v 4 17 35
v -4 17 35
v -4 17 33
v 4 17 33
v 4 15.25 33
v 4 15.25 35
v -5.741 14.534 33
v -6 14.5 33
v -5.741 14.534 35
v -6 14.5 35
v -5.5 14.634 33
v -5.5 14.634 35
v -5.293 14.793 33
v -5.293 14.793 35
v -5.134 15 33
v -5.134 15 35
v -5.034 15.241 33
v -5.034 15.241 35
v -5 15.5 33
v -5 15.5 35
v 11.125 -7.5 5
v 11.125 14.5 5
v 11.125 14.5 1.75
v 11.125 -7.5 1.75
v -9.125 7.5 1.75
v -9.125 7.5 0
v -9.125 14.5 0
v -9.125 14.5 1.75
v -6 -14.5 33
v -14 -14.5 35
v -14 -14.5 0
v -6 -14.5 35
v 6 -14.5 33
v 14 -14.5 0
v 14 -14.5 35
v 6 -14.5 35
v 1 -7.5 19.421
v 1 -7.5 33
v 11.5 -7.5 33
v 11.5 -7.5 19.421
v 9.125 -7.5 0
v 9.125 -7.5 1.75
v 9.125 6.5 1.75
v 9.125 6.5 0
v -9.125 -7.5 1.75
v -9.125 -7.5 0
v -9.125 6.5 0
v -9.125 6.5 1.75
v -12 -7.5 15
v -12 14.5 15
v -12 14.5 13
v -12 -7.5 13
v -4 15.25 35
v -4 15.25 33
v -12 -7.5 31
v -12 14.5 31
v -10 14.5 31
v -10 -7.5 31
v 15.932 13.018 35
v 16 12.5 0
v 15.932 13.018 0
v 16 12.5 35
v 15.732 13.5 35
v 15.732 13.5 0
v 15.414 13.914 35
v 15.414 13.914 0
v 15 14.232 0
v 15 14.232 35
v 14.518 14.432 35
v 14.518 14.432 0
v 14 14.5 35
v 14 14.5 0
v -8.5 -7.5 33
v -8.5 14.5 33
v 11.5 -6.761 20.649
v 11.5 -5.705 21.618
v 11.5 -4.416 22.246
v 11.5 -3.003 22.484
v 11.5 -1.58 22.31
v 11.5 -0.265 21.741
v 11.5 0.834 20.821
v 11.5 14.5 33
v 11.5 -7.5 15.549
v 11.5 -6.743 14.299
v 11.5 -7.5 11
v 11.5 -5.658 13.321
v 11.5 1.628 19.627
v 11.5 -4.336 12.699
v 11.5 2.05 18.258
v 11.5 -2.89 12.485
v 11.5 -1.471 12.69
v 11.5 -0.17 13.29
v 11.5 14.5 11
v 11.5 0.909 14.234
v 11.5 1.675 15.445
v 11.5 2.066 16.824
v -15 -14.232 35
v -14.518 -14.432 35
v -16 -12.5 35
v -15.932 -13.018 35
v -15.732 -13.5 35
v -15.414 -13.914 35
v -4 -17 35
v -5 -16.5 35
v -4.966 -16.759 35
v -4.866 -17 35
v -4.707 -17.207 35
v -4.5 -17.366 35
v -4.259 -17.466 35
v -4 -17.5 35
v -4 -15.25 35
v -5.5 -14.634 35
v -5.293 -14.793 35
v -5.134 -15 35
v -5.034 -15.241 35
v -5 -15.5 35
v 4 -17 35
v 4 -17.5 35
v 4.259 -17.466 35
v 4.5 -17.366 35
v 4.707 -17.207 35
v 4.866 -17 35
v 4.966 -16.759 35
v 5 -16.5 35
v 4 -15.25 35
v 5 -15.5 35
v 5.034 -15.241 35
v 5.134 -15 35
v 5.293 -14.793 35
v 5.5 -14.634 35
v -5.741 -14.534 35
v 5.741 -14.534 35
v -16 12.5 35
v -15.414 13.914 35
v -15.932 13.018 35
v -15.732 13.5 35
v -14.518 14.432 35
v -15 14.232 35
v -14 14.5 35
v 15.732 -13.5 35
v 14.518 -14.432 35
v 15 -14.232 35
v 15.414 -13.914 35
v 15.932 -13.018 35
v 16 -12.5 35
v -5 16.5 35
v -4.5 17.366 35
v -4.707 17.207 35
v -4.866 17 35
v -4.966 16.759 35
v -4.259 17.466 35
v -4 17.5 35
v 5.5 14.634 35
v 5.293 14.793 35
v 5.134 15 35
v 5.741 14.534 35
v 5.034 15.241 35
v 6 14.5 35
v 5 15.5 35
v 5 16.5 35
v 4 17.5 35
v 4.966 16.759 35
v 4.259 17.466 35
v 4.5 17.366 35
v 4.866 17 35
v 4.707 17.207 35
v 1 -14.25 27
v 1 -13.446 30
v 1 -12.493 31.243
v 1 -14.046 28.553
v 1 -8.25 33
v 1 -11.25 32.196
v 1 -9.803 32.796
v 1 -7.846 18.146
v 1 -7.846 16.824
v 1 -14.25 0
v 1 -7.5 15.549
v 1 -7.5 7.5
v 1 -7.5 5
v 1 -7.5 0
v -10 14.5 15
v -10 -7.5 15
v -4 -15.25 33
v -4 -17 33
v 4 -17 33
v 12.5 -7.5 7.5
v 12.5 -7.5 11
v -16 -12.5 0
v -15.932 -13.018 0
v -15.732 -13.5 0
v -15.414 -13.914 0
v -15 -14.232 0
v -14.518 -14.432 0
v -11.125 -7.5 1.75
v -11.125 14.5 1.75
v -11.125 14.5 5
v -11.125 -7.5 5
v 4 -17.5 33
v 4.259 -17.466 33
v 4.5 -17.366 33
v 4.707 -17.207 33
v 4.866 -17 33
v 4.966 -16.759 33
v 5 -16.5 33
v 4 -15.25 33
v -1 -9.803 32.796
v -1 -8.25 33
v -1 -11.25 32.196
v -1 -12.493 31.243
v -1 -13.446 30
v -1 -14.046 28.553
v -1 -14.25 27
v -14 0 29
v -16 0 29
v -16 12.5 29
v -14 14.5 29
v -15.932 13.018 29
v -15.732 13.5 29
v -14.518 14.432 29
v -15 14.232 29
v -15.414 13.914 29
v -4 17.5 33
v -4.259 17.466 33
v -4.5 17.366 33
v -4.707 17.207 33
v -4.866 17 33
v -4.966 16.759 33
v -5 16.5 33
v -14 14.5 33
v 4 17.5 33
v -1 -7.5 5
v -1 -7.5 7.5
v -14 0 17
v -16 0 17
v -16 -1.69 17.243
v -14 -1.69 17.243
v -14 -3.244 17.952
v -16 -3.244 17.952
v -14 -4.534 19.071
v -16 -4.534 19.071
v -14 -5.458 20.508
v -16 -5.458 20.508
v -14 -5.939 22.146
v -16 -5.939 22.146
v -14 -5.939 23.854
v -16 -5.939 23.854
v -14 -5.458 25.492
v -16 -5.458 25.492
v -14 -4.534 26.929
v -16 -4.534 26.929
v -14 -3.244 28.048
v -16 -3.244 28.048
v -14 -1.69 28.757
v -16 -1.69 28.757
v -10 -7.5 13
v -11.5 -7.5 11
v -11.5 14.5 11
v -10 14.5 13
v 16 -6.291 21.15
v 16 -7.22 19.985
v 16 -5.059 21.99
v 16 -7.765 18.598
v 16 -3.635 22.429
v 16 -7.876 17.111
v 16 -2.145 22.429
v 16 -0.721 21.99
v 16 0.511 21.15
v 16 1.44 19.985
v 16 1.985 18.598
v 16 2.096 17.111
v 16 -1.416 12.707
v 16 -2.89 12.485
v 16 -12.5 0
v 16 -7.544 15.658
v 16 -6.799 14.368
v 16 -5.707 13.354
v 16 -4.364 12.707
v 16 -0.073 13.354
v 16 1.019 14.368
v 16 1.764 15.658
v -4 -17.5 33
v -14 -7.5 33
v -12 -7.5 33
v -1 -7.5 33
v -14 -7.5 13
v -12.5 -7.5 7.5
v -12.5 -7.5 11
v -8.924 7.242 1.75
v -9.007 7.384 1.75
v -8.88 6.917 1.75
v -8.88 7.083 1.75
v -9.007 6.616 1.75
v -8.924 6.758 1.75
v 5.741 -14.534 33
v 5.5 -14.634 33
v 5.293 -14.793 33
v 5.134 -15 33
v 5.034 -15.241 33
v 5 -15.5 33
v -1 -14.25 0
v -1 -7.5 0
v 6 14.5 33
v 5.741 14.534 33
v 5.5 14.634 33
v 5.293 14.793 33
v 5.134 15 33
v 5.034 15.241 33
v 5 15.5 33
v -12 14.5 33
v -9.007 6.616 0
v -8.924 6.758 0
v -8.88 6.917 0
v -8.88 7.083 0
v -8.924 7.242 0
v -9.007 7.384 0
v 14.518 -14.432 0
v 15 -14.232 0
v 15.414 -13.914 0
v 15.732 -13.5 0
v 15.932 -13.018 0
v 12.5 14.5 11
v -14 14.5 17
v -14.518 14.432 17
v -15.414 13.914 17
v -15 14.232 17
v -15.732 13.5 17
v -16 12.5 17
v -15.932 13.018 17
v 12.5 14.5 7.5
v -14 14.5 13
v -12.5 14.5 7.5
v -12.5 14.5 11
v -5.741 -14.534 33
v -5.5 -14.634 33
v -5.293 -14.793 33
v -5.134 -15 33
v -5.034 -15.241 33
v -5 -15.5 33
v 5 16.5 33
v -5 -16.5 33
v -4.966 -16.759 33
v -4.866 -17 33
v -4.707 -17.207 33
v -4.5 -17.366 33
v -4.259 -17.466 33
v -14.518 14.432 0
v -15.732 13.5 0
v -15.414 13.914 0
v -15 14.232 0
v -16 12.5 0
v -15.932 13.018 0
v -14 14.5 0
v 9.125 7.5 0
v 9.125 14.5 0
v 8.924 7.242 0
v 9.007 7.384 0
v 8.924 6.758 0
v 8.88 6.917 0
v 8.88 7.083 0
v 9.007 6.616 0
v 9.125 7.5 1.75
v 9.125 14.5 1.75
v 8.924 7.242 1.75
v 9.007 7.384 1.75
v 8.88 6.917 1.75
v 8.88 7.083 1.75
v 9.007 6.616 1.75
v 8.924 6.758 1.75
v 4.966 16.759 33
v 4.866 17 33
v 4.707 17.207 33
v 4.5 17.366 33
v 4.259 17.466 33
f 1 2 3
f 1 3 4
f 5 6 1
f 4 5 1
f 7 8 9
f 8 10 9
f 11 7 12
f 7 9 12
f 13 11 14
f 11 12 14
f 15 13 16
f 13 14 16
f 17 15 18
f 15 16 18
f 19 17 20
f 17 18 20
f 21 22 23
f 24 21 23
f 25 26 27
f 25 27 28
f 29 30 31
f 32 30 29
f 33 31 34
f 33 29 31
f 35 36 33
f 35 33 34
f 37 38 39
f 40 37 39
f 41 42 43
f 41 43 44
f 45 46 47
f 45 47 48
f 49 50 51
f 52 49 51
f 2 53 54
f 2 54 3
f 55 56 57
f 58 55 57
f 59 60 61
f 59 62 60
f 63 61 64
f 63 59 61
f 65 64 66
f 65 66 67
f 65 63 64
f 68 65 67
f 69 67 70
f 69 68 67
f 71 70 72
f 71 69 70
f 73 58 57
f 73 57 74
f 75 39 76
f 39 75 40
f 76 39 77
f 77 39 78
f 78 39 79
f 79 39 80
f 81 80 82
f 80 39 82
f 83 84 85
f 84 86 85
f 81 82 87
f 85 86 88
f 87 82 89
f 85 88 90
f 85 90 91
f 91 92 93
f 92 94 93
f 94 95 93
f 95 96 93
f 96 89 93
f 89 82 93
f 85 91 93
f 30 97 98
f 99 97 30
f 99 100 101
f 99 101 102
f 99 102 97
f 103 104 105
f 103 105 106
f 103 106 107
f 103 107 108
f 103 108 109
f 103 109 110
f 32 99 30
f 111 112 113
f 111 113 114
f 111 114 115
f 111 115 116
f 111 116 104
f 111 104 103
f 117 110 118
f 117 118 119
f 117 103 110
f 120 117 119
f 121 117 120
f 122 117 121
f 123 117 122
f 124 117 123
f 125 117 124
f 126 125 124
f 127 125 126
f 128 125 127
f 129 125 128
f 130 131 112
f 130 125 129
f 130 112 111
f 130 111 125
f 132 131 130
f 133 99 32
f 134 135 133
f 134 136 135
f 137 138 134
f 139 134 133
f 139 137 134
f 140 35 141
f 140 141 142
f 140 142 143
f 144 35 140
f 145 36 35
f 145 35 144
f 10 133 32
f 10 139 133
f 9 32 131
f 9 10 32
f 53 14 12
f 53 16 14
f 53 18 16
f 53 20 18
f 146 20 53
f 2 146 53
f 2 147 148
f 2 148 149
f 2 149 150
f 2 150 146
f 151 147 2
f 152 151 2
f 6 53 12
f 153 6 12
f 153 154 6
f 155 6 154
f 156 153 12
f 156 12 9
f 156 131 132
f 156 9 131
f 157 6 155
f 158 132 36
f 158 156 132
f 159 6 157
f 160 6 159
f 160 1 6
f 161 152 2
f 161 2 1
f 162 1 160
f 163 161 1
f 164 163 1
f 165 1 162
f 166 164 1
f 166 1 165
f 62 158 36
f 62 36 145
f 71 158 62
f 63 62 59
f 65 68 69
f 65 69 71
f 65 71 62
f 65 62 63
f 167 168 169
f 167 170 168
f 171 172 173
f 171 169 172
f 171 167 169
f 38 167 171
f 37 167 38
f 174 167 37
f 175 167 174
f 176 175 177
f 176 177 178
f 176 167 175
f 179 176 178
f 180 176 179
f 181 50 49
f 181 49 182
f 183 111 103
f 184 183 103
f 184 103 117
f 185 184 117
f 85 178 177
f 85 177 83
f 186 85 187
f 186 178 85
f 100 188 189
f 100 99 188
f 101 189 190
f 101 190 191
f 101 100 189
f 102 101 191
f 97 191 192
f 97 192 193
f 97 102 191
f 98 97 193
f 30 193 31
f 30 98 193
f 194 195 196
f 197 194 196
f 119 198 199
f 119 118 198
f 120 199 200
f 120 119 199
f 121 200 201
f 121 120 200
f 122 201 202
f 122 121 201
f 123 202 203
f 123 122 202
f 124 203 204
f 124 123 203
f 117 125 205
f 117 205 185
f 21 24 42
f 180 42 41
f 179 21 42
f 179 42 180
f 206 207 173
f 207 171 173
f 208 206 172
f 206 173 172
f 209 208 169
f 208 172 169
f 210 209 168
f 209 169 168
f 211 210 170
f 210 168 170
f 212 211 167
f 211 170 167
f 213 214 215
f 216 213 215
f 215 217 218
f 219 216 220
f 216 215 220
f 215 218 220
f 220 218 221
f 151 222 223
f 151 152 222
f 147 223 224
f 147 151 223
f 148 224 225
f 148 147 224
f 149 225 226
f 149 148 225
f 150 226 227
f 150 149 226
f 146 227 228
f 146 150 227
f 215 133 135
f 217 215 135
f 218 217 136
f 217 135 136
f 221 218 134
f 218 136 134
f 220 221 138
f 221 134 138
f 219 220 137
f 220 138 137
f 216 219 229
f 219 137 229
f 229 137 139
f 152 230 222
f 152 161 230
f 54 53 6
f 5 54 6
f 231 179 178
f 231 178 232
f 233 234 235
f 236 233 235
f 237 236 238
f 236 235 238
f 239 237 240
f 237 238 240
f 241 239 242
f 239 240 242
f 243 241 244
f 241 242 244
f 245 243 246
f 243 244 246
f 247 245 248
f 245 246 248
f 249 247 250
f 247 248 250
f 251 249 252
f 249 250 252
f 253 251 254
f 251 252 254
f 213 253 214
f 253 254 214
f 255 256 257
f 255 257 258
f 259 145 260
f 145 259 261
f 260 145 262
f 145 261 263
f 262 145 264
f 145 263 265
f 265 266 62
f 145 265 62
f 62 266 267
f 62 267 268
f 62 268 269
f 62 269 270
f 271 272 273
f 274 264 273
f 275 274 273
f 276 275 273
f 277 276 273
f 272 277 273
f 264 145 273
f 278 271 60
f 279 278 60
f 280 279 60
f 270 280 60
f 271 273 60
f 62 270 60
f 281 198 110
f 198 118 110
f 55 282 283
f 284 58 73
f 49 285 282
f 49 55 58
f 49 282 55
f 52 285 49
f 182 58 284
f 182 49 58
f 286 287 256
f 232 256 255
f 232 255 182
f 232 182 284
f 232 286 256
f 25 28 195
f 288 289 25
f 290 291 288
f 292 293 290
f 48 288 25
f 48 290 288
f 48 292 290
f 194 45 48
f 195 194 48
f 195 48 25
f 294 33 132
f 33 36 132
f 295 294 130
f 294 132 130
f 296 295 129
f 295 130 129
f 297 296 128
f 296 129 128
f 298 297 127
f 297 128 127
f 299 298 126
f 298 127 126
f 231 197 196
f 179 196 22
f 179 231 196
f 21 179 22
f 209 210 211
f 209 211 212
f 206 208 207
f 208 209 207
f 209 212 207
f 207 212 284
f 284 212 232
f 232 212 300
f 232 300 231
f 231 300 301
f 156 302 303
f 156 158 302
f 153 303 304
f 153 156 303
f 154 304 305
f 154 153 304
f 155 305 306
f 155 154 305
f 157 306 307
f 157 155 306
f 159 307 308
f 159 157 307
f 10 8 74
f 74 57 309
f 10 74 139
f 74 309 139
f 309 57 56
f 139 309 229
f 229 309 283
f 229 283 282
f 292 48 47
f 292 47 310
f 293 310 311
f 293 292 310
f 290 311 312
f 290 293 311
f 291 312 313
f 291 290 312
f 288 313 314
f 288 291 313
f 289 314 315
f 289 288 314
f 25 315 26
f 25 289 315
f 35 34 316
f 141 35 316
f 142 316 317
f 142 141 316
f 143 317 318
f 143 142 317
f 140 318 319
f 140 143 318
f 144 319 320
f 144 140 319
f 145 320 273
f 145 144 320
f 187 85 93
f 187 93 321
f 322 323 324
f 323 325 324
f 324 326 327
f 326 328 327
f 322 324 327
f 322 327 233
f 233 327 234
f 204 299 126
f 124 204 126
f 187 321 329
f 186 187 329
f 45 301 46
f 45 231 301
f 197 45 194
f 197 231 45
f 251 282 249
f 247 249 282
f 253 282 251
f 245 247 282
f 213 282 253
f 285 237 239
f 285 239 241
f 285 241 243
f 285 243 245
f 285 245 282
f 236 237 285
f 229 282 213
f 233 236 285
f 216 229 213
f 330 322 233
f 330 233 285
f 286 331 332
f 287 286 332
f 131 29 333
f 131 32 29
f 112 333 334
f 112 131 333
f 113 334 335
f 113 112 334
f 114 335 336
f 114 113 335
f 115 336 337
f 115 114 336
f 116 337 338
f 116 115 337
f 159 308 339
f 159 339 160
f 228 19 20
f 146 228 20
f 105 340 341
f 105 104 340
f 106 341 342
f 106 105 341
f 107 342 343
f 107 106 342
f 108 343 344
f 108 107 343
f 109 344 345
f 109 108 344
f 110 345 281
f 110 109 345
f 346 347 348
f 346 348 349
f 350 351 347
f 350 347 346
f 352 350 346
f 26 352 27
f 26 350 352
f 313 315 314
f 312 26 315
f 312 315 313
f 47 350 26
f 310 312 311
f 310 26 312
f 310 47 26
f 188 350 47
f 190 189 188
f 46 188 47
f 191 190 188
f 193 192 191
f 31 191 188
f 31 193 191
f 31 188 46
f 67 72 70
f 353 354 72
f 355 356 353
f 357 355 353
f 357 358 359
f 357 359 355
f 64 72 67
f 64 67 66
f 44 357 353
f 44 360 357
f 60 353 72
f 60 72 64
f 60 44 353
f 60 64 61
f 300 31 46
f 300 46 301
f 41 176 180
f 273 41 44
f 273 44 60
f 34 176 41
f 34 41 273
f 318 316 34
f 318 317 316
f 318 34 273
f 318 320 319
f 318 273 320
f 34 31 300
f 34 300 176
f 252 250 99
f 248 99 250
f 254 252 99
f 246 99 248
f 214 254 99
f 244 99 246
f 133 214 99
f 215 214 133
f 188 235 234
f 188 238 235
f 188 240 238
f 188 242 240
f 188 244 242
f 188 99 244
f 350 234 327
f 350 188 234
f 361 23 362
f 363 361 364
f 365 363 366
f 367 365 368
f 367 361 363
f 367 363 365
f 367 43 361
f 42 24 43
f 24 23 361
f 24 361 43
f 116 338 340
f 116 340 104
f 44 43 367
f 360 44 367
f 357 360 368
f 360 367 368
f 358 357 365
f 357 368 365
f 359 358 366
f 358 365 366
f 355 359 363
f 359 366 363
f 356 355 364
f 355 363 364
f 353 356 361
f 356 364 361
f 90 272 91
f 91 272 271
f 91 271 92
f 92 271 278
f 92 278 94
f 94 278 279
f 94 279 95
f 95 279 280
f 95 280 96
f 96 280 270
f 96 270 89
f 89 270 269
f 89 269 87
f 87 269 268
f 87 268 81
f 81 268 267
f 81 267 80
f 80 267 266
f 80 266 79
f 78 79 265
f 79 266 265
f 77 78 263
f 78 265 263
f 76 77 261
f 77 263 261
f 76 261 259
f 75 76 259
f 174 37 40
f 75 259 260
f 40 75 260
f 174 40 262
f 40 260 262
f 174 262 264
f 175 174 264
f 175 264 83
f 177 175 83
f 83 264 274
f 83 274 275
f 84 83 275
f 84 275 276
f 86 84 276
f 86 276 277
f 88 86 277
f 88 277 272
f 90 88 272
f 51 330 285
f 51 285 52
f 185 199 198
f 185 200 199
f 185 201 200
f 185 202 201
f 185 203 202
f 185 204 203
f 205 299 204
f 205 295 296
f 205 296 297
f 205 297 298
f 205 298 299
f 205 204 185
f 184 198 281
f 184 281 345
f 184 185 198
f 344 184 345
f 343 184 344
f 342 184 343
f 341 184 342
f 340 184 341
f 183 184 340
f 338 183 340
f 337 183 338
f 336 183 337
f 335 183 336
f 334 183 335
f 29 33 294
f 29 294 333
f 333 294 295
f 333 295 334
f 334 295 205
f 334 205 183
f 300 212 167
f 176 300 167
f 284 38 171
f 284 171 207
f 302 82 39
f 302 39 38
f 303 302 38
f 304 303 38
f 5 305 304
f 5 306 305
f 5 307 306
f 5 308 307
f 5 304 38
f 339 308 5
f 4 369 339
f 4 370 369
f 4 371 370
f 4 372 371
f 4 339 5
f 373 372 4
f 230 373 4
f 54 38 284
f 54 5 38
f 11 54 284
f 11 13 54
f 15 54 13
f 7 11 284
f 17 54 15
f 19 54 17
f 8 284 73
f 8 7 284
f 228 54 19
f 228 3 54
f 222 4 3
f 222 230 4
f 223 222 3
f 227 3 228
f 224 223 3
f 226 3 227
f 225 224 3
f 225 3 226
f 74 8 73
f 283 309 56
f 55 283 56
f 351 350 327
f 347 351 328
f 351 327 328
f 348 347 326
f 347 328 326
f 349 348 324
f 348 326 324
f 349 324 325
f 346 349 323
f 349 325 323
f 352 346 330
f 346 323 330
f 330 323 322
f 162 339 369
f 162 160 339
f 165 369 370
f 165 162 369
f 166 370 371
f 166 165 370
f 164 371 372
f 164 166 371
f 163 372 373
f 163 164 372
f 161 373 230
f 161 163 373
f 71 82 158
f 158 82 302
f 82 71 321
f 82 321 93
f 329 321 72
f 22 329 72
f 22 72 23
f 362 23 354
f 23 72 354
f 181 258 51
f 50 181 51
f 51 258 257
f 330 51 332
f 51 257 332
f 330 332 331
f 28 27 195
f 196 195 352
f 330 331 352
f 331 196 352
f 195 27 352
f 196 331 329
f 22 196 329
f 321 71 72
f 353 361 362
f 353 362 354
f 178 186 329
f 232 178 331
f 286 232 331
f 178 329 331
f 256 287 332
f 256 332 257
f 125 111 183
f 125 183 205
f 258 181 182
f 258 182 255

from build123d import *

# Parameters (mm, degrees)
SKETCH1_W                = 32
SKETCH1_H                = 29
BOSS_EXTRUDE1_DEPTH      = 35
FILLET1_R                = 2
SLOT_FOR_COIL_DEPTH      = 1
SLOT_FOR_COIL_DEPTH_BACK = 30
BOSS_EXTRUDE2_DEPTH      = 7
BOSS_EXTRUDE3_DEPTH      = 1.75
SKETCH5_W                = 2
SKETCH5_H                = 7
CUT_EXTRUDE2_DEPTH       = 33
CUT_EXTRUDE3_DEPTH       = 22
SKETCH7_W                = 2
SKETCH7_H                = 33
BOSS_EXTRUDE4_DEPTH      = 0.25
FILLET2_R                = 6
CUT_EXTRUDE5_DEPTH       = 4.5
SKETCH14_W               = 2.5
SKETCH14_H               = 20
CUT_EXTRUDE6_DEPTH       = 22
SKETCH16_W               = 2
SKETCH16_H               = 2
BOSS_EXTRUDE5_DEPTH      = 22
BOSS_EXTRUDE6_DEPTH      = 22
SKETCH21_W               = 10
SKETCH21_H               = 2
BOSS_EXTRUDE7_DEPTH      = 3
SKETCH23_W               = 8
SKETCH23_H               = 1.75
CUT_EXTRUDE7_DEPTH       = 2
FILLET3_R                = 1
CUT_EXTRUDE8_REACH       = 34
SKETCH26_R               = 5


with BuildPart() as part:
    # Sketch1 → Boss-Extrude1 (new body)
    with BuildSketch(Plane.XY):
        Rectangle(SKETCH1_W, SKETCH1_H)
    extrude(amount=BOSS_EXTRUDE1_DEPTH)

    # Fillet1
    fillet1_edges = [part.edges().sort_by_distance(p)[0] for p in [
        (16, -14.5, 17.5),
        (-16, -14.5, 17.5),
        (-16, 14.5, 17.5),
        (16, 14.5, 17.5),
    ]]
    fillet(fillet1_edges, radius=FILLET1_R)

    # Sketch2 → Slot for Coil (cut, two sides)
    with BuildSketch(Plane.XZ.offset(14.5)) as slot_for_coil_sk:
        Polygon((-9.125, 0), (-9.125, 1.75), (-11.125, 1.75), (-11.125, 5), (11.125, 5), (11.125, 1.75), (9.125, 1.75), (9.125, 0), align=None)
    extrude(amount=SLOT_FOR_COIL_DEPTH, mode=Mode.SUBTRACT)
    extrude(slot_for_coil_sk.sketch, amount=-SLOT_FOR_COIL_DEPTH_BACK, mode=Mode.SUBTRACT)

    # Sketch3 → Boss-Extrude2 (add)
    with BuildSketch(Plane.XZ.offset(14.5)):
        Polygon((-9.125, 0), (-9.125, 1.75), (-11.125, 1.75), (-11.125, 5), (11.125, 5), (11.125, 1.75), (9.125, 1.75), (9.125, 0), align=None)
    extrude(amount=-BOSS_EXTRUDE2_DEPTH)

    # Sketch4 → Boss-Extrude3 (add)
    with BuildSketch(Plane(origin=(0, 0, 1.75), x_dir=(-1, 0, 0), z_dir=(0, 0, -1))):
        with BuildLine():
            Line((-9.125, 7.5), (-9.125, 6.5))
            ThreePointArc((-9.125, 6.5), (-8.875, 7), (-9.125, 7.5))
        make_face()
    boss_extrude3 = extrude(amount=BOSS_EXTRUDE3_DEPTH)

    # Mirror1: Boss-Extrude3 across plane
    add(boss_extrude3.mirror(Plane(origin=(0, 0, 0), x_dir=(0, 0, 1), z_dir=(1, 0, 0))))

    # Sketch5 → Cut-Extrude2 (cut)
    with BuildSketch(Plane(origin=(0, 0, 0), x_dir=(-1, 0, 0), z_dir=(0, 0, -1))):
        with Locations((0, -11)):
            Rectangle(SKETCH5_W, SKETCH5_H)
    extrude(amount=-CUT_EXTRUDE2_DEPTH, mode=Mode.SUBTRACT)

    # Sketch6 → Cut-Extrude3 (cut)
    with BuildSketch(Plane(origin=(0, 14.5, 0), x_dir=(1, 0, 0), z_dir=(0, 1, 0))):
        Polygon((-12.5, -7.5), (-12.5, -11), (-11.5, -11), (-11.5, -33), (11.5, -33), (11.5, -11), (12.5, -11), (12.5, -7.5), align=None)
    extrude(amount=-CUT_EXTRUDE3_DEPTH, mode=Mode.SUBTRACT)

    # Sketch7 → Boss-Extrude4 (add)
    with BuildSketch(Plane.XZ.offset(14.5)):
        with Locations((0, 16.5)):
            Rectangle(SKETCH7_W, SKETCH7_H)
    extrude(amount=-BOSS_EXTRUDE4_DEPTH)

    # Fillet2
    fillet2_edges = [part.edges().sort_by_distance(p)[0] for p in [
        (0, -14.25, 33),
    ]]
    fillet(fillet2_edges, radius=FILLET2_R)

    # Sketch11 → Cut-Extrude5 (cut)
    with BuildSketch(Plane(origin=(-16, 0, 44), x_dir=(0, 0, -1), z_dir=(1, 0, 0))):
        with BuildLine():
            Line((27, 25), (27, 0))
            ThreePointArc((27, 0), (21, -6), (15, 0))
            Line((15, 0), (15, 25))
            ThreePointArc((15, 25), (21, 31), (27, 25))
        make_face()
    extrude(amount=CUT_EXTRUDE5_DEPTH, mode=Mode.SUBTRACT)

    # Sketch14 → Cut-Extrude6 (cut)
    with BuildSketch(Plane(origin=(0, 14.5, 0), x_dir=(1, 0, 0), z_dir=(0, 1, 0))):
        with Locations((-12.75, -23)):
            Rectangle(SKETCH14_W, SKETCH14_H)
    extrude(amount=-CUT_EXTRUDE6_DEPTH, mode=Mode.SUBTRACT)

    # Sketch16 → Boss-Extrude5 (add)
    with BuildSketch(Plane(origin=(0, 14.5, 0), x_dir=(1, 0, 0), z_dir=(0, 1, 0))):
        with Locations((-11, -14)):
            Rectangle(SKETCH16_W, SKETCH16_H)
        with Locations((-11, -32)):
            Rectangle(SKETCH16_W, SKETCH16_H)
    extrude(amount=-BOSS_EXTRUDE5_DEPTH)

    # Sketch20 → Boss-Extrude6 (add)
    with BuildSketch(Plane(origin=(0, 14.5, 0), x_dir=(1, 0, 0), z_dir=(0, 1, 0))):
        Polygon((-11.5, -11), (-10, -13), (-11.5, -13), align=None)
        Polygon((-10, -31), (-8.5, -33), (-10, -33), align=None)
    extrude(amount=-BOSS_EXTRUDE6_DEPTH)

    # Sketch21 → Boss-Extrude7 (add)
    with BuildSketch(Plane(origin=(0, 14.5, 0), x_dir=(-1, 0, 0), z_dir=(0, 1, 0))):
        with Locations((0, 34)):
            Rectangle(SKETCH21_W, SKETCH21_H)
    boss_extrude7 = extrude(amount=BOSS_EXTRUDE7_DEPTH)

    # Sketch23 → Cut-Extrude7 (cut)
    with BuildSketch(Plane.XY.offset(35)):
        with Locations((0, 16.125)):
            Rectangle(SKETCH23_W, SKETCH23_H)
    cut_extrude7 = extrude(amount=-CUT_EXTRUDE7_DEPTH, mode=Mode.SUBTRACT)

    # Mirror3: Boss-Extrude7, Cut-Extrude7 across plane
    add(boss_extrude7.mirror(Plane.ZX))
    add(cut_extrude7.mirror(Plane.ZX), mode=Mode.SUBTRACT)

    # Fillet3
    fillet3_edges = [part.edges().sort_by_distance(p)[0] for p in [
        (5, 14.5, 34),
        (-5, 14.5, 34),
        (5, 17.5, 34),
        (-5, 17.5, 34),
        (5, -17.5, 34),
        (-5, -17.5, 34),
        (5, -14.5, 34),
        (-5, -14.5, 34),
    ]]
    fillet(fillet3_edges, radius=FILLET3_R)

    # Sketch26 → Cut-Extrude8 (cut, up to next)
    with BuildSketch(Plane(origin=(16, 0, 0), x_dir=(0, 0, -1), z_dir=(1, 0, 0)), mode=Mode.PRIVATE) as cut_extrude8_sk1:
        with Locations((-17.485, -2.89)):
            Circle(SKETCH26_R)
    cut_extrude8_tool1 = extrude(cut_extrude8_sk1.sketch, amount=-CUT_EXTRUDE8_REACH, mode=Mode.PRIVATE) & part.part
    add(cut_extrude8_tool1.solids().sort_by_distance((16, -2.89, 17.485))[0], mode=Mode.SUBTRACT)


solid = part.part
